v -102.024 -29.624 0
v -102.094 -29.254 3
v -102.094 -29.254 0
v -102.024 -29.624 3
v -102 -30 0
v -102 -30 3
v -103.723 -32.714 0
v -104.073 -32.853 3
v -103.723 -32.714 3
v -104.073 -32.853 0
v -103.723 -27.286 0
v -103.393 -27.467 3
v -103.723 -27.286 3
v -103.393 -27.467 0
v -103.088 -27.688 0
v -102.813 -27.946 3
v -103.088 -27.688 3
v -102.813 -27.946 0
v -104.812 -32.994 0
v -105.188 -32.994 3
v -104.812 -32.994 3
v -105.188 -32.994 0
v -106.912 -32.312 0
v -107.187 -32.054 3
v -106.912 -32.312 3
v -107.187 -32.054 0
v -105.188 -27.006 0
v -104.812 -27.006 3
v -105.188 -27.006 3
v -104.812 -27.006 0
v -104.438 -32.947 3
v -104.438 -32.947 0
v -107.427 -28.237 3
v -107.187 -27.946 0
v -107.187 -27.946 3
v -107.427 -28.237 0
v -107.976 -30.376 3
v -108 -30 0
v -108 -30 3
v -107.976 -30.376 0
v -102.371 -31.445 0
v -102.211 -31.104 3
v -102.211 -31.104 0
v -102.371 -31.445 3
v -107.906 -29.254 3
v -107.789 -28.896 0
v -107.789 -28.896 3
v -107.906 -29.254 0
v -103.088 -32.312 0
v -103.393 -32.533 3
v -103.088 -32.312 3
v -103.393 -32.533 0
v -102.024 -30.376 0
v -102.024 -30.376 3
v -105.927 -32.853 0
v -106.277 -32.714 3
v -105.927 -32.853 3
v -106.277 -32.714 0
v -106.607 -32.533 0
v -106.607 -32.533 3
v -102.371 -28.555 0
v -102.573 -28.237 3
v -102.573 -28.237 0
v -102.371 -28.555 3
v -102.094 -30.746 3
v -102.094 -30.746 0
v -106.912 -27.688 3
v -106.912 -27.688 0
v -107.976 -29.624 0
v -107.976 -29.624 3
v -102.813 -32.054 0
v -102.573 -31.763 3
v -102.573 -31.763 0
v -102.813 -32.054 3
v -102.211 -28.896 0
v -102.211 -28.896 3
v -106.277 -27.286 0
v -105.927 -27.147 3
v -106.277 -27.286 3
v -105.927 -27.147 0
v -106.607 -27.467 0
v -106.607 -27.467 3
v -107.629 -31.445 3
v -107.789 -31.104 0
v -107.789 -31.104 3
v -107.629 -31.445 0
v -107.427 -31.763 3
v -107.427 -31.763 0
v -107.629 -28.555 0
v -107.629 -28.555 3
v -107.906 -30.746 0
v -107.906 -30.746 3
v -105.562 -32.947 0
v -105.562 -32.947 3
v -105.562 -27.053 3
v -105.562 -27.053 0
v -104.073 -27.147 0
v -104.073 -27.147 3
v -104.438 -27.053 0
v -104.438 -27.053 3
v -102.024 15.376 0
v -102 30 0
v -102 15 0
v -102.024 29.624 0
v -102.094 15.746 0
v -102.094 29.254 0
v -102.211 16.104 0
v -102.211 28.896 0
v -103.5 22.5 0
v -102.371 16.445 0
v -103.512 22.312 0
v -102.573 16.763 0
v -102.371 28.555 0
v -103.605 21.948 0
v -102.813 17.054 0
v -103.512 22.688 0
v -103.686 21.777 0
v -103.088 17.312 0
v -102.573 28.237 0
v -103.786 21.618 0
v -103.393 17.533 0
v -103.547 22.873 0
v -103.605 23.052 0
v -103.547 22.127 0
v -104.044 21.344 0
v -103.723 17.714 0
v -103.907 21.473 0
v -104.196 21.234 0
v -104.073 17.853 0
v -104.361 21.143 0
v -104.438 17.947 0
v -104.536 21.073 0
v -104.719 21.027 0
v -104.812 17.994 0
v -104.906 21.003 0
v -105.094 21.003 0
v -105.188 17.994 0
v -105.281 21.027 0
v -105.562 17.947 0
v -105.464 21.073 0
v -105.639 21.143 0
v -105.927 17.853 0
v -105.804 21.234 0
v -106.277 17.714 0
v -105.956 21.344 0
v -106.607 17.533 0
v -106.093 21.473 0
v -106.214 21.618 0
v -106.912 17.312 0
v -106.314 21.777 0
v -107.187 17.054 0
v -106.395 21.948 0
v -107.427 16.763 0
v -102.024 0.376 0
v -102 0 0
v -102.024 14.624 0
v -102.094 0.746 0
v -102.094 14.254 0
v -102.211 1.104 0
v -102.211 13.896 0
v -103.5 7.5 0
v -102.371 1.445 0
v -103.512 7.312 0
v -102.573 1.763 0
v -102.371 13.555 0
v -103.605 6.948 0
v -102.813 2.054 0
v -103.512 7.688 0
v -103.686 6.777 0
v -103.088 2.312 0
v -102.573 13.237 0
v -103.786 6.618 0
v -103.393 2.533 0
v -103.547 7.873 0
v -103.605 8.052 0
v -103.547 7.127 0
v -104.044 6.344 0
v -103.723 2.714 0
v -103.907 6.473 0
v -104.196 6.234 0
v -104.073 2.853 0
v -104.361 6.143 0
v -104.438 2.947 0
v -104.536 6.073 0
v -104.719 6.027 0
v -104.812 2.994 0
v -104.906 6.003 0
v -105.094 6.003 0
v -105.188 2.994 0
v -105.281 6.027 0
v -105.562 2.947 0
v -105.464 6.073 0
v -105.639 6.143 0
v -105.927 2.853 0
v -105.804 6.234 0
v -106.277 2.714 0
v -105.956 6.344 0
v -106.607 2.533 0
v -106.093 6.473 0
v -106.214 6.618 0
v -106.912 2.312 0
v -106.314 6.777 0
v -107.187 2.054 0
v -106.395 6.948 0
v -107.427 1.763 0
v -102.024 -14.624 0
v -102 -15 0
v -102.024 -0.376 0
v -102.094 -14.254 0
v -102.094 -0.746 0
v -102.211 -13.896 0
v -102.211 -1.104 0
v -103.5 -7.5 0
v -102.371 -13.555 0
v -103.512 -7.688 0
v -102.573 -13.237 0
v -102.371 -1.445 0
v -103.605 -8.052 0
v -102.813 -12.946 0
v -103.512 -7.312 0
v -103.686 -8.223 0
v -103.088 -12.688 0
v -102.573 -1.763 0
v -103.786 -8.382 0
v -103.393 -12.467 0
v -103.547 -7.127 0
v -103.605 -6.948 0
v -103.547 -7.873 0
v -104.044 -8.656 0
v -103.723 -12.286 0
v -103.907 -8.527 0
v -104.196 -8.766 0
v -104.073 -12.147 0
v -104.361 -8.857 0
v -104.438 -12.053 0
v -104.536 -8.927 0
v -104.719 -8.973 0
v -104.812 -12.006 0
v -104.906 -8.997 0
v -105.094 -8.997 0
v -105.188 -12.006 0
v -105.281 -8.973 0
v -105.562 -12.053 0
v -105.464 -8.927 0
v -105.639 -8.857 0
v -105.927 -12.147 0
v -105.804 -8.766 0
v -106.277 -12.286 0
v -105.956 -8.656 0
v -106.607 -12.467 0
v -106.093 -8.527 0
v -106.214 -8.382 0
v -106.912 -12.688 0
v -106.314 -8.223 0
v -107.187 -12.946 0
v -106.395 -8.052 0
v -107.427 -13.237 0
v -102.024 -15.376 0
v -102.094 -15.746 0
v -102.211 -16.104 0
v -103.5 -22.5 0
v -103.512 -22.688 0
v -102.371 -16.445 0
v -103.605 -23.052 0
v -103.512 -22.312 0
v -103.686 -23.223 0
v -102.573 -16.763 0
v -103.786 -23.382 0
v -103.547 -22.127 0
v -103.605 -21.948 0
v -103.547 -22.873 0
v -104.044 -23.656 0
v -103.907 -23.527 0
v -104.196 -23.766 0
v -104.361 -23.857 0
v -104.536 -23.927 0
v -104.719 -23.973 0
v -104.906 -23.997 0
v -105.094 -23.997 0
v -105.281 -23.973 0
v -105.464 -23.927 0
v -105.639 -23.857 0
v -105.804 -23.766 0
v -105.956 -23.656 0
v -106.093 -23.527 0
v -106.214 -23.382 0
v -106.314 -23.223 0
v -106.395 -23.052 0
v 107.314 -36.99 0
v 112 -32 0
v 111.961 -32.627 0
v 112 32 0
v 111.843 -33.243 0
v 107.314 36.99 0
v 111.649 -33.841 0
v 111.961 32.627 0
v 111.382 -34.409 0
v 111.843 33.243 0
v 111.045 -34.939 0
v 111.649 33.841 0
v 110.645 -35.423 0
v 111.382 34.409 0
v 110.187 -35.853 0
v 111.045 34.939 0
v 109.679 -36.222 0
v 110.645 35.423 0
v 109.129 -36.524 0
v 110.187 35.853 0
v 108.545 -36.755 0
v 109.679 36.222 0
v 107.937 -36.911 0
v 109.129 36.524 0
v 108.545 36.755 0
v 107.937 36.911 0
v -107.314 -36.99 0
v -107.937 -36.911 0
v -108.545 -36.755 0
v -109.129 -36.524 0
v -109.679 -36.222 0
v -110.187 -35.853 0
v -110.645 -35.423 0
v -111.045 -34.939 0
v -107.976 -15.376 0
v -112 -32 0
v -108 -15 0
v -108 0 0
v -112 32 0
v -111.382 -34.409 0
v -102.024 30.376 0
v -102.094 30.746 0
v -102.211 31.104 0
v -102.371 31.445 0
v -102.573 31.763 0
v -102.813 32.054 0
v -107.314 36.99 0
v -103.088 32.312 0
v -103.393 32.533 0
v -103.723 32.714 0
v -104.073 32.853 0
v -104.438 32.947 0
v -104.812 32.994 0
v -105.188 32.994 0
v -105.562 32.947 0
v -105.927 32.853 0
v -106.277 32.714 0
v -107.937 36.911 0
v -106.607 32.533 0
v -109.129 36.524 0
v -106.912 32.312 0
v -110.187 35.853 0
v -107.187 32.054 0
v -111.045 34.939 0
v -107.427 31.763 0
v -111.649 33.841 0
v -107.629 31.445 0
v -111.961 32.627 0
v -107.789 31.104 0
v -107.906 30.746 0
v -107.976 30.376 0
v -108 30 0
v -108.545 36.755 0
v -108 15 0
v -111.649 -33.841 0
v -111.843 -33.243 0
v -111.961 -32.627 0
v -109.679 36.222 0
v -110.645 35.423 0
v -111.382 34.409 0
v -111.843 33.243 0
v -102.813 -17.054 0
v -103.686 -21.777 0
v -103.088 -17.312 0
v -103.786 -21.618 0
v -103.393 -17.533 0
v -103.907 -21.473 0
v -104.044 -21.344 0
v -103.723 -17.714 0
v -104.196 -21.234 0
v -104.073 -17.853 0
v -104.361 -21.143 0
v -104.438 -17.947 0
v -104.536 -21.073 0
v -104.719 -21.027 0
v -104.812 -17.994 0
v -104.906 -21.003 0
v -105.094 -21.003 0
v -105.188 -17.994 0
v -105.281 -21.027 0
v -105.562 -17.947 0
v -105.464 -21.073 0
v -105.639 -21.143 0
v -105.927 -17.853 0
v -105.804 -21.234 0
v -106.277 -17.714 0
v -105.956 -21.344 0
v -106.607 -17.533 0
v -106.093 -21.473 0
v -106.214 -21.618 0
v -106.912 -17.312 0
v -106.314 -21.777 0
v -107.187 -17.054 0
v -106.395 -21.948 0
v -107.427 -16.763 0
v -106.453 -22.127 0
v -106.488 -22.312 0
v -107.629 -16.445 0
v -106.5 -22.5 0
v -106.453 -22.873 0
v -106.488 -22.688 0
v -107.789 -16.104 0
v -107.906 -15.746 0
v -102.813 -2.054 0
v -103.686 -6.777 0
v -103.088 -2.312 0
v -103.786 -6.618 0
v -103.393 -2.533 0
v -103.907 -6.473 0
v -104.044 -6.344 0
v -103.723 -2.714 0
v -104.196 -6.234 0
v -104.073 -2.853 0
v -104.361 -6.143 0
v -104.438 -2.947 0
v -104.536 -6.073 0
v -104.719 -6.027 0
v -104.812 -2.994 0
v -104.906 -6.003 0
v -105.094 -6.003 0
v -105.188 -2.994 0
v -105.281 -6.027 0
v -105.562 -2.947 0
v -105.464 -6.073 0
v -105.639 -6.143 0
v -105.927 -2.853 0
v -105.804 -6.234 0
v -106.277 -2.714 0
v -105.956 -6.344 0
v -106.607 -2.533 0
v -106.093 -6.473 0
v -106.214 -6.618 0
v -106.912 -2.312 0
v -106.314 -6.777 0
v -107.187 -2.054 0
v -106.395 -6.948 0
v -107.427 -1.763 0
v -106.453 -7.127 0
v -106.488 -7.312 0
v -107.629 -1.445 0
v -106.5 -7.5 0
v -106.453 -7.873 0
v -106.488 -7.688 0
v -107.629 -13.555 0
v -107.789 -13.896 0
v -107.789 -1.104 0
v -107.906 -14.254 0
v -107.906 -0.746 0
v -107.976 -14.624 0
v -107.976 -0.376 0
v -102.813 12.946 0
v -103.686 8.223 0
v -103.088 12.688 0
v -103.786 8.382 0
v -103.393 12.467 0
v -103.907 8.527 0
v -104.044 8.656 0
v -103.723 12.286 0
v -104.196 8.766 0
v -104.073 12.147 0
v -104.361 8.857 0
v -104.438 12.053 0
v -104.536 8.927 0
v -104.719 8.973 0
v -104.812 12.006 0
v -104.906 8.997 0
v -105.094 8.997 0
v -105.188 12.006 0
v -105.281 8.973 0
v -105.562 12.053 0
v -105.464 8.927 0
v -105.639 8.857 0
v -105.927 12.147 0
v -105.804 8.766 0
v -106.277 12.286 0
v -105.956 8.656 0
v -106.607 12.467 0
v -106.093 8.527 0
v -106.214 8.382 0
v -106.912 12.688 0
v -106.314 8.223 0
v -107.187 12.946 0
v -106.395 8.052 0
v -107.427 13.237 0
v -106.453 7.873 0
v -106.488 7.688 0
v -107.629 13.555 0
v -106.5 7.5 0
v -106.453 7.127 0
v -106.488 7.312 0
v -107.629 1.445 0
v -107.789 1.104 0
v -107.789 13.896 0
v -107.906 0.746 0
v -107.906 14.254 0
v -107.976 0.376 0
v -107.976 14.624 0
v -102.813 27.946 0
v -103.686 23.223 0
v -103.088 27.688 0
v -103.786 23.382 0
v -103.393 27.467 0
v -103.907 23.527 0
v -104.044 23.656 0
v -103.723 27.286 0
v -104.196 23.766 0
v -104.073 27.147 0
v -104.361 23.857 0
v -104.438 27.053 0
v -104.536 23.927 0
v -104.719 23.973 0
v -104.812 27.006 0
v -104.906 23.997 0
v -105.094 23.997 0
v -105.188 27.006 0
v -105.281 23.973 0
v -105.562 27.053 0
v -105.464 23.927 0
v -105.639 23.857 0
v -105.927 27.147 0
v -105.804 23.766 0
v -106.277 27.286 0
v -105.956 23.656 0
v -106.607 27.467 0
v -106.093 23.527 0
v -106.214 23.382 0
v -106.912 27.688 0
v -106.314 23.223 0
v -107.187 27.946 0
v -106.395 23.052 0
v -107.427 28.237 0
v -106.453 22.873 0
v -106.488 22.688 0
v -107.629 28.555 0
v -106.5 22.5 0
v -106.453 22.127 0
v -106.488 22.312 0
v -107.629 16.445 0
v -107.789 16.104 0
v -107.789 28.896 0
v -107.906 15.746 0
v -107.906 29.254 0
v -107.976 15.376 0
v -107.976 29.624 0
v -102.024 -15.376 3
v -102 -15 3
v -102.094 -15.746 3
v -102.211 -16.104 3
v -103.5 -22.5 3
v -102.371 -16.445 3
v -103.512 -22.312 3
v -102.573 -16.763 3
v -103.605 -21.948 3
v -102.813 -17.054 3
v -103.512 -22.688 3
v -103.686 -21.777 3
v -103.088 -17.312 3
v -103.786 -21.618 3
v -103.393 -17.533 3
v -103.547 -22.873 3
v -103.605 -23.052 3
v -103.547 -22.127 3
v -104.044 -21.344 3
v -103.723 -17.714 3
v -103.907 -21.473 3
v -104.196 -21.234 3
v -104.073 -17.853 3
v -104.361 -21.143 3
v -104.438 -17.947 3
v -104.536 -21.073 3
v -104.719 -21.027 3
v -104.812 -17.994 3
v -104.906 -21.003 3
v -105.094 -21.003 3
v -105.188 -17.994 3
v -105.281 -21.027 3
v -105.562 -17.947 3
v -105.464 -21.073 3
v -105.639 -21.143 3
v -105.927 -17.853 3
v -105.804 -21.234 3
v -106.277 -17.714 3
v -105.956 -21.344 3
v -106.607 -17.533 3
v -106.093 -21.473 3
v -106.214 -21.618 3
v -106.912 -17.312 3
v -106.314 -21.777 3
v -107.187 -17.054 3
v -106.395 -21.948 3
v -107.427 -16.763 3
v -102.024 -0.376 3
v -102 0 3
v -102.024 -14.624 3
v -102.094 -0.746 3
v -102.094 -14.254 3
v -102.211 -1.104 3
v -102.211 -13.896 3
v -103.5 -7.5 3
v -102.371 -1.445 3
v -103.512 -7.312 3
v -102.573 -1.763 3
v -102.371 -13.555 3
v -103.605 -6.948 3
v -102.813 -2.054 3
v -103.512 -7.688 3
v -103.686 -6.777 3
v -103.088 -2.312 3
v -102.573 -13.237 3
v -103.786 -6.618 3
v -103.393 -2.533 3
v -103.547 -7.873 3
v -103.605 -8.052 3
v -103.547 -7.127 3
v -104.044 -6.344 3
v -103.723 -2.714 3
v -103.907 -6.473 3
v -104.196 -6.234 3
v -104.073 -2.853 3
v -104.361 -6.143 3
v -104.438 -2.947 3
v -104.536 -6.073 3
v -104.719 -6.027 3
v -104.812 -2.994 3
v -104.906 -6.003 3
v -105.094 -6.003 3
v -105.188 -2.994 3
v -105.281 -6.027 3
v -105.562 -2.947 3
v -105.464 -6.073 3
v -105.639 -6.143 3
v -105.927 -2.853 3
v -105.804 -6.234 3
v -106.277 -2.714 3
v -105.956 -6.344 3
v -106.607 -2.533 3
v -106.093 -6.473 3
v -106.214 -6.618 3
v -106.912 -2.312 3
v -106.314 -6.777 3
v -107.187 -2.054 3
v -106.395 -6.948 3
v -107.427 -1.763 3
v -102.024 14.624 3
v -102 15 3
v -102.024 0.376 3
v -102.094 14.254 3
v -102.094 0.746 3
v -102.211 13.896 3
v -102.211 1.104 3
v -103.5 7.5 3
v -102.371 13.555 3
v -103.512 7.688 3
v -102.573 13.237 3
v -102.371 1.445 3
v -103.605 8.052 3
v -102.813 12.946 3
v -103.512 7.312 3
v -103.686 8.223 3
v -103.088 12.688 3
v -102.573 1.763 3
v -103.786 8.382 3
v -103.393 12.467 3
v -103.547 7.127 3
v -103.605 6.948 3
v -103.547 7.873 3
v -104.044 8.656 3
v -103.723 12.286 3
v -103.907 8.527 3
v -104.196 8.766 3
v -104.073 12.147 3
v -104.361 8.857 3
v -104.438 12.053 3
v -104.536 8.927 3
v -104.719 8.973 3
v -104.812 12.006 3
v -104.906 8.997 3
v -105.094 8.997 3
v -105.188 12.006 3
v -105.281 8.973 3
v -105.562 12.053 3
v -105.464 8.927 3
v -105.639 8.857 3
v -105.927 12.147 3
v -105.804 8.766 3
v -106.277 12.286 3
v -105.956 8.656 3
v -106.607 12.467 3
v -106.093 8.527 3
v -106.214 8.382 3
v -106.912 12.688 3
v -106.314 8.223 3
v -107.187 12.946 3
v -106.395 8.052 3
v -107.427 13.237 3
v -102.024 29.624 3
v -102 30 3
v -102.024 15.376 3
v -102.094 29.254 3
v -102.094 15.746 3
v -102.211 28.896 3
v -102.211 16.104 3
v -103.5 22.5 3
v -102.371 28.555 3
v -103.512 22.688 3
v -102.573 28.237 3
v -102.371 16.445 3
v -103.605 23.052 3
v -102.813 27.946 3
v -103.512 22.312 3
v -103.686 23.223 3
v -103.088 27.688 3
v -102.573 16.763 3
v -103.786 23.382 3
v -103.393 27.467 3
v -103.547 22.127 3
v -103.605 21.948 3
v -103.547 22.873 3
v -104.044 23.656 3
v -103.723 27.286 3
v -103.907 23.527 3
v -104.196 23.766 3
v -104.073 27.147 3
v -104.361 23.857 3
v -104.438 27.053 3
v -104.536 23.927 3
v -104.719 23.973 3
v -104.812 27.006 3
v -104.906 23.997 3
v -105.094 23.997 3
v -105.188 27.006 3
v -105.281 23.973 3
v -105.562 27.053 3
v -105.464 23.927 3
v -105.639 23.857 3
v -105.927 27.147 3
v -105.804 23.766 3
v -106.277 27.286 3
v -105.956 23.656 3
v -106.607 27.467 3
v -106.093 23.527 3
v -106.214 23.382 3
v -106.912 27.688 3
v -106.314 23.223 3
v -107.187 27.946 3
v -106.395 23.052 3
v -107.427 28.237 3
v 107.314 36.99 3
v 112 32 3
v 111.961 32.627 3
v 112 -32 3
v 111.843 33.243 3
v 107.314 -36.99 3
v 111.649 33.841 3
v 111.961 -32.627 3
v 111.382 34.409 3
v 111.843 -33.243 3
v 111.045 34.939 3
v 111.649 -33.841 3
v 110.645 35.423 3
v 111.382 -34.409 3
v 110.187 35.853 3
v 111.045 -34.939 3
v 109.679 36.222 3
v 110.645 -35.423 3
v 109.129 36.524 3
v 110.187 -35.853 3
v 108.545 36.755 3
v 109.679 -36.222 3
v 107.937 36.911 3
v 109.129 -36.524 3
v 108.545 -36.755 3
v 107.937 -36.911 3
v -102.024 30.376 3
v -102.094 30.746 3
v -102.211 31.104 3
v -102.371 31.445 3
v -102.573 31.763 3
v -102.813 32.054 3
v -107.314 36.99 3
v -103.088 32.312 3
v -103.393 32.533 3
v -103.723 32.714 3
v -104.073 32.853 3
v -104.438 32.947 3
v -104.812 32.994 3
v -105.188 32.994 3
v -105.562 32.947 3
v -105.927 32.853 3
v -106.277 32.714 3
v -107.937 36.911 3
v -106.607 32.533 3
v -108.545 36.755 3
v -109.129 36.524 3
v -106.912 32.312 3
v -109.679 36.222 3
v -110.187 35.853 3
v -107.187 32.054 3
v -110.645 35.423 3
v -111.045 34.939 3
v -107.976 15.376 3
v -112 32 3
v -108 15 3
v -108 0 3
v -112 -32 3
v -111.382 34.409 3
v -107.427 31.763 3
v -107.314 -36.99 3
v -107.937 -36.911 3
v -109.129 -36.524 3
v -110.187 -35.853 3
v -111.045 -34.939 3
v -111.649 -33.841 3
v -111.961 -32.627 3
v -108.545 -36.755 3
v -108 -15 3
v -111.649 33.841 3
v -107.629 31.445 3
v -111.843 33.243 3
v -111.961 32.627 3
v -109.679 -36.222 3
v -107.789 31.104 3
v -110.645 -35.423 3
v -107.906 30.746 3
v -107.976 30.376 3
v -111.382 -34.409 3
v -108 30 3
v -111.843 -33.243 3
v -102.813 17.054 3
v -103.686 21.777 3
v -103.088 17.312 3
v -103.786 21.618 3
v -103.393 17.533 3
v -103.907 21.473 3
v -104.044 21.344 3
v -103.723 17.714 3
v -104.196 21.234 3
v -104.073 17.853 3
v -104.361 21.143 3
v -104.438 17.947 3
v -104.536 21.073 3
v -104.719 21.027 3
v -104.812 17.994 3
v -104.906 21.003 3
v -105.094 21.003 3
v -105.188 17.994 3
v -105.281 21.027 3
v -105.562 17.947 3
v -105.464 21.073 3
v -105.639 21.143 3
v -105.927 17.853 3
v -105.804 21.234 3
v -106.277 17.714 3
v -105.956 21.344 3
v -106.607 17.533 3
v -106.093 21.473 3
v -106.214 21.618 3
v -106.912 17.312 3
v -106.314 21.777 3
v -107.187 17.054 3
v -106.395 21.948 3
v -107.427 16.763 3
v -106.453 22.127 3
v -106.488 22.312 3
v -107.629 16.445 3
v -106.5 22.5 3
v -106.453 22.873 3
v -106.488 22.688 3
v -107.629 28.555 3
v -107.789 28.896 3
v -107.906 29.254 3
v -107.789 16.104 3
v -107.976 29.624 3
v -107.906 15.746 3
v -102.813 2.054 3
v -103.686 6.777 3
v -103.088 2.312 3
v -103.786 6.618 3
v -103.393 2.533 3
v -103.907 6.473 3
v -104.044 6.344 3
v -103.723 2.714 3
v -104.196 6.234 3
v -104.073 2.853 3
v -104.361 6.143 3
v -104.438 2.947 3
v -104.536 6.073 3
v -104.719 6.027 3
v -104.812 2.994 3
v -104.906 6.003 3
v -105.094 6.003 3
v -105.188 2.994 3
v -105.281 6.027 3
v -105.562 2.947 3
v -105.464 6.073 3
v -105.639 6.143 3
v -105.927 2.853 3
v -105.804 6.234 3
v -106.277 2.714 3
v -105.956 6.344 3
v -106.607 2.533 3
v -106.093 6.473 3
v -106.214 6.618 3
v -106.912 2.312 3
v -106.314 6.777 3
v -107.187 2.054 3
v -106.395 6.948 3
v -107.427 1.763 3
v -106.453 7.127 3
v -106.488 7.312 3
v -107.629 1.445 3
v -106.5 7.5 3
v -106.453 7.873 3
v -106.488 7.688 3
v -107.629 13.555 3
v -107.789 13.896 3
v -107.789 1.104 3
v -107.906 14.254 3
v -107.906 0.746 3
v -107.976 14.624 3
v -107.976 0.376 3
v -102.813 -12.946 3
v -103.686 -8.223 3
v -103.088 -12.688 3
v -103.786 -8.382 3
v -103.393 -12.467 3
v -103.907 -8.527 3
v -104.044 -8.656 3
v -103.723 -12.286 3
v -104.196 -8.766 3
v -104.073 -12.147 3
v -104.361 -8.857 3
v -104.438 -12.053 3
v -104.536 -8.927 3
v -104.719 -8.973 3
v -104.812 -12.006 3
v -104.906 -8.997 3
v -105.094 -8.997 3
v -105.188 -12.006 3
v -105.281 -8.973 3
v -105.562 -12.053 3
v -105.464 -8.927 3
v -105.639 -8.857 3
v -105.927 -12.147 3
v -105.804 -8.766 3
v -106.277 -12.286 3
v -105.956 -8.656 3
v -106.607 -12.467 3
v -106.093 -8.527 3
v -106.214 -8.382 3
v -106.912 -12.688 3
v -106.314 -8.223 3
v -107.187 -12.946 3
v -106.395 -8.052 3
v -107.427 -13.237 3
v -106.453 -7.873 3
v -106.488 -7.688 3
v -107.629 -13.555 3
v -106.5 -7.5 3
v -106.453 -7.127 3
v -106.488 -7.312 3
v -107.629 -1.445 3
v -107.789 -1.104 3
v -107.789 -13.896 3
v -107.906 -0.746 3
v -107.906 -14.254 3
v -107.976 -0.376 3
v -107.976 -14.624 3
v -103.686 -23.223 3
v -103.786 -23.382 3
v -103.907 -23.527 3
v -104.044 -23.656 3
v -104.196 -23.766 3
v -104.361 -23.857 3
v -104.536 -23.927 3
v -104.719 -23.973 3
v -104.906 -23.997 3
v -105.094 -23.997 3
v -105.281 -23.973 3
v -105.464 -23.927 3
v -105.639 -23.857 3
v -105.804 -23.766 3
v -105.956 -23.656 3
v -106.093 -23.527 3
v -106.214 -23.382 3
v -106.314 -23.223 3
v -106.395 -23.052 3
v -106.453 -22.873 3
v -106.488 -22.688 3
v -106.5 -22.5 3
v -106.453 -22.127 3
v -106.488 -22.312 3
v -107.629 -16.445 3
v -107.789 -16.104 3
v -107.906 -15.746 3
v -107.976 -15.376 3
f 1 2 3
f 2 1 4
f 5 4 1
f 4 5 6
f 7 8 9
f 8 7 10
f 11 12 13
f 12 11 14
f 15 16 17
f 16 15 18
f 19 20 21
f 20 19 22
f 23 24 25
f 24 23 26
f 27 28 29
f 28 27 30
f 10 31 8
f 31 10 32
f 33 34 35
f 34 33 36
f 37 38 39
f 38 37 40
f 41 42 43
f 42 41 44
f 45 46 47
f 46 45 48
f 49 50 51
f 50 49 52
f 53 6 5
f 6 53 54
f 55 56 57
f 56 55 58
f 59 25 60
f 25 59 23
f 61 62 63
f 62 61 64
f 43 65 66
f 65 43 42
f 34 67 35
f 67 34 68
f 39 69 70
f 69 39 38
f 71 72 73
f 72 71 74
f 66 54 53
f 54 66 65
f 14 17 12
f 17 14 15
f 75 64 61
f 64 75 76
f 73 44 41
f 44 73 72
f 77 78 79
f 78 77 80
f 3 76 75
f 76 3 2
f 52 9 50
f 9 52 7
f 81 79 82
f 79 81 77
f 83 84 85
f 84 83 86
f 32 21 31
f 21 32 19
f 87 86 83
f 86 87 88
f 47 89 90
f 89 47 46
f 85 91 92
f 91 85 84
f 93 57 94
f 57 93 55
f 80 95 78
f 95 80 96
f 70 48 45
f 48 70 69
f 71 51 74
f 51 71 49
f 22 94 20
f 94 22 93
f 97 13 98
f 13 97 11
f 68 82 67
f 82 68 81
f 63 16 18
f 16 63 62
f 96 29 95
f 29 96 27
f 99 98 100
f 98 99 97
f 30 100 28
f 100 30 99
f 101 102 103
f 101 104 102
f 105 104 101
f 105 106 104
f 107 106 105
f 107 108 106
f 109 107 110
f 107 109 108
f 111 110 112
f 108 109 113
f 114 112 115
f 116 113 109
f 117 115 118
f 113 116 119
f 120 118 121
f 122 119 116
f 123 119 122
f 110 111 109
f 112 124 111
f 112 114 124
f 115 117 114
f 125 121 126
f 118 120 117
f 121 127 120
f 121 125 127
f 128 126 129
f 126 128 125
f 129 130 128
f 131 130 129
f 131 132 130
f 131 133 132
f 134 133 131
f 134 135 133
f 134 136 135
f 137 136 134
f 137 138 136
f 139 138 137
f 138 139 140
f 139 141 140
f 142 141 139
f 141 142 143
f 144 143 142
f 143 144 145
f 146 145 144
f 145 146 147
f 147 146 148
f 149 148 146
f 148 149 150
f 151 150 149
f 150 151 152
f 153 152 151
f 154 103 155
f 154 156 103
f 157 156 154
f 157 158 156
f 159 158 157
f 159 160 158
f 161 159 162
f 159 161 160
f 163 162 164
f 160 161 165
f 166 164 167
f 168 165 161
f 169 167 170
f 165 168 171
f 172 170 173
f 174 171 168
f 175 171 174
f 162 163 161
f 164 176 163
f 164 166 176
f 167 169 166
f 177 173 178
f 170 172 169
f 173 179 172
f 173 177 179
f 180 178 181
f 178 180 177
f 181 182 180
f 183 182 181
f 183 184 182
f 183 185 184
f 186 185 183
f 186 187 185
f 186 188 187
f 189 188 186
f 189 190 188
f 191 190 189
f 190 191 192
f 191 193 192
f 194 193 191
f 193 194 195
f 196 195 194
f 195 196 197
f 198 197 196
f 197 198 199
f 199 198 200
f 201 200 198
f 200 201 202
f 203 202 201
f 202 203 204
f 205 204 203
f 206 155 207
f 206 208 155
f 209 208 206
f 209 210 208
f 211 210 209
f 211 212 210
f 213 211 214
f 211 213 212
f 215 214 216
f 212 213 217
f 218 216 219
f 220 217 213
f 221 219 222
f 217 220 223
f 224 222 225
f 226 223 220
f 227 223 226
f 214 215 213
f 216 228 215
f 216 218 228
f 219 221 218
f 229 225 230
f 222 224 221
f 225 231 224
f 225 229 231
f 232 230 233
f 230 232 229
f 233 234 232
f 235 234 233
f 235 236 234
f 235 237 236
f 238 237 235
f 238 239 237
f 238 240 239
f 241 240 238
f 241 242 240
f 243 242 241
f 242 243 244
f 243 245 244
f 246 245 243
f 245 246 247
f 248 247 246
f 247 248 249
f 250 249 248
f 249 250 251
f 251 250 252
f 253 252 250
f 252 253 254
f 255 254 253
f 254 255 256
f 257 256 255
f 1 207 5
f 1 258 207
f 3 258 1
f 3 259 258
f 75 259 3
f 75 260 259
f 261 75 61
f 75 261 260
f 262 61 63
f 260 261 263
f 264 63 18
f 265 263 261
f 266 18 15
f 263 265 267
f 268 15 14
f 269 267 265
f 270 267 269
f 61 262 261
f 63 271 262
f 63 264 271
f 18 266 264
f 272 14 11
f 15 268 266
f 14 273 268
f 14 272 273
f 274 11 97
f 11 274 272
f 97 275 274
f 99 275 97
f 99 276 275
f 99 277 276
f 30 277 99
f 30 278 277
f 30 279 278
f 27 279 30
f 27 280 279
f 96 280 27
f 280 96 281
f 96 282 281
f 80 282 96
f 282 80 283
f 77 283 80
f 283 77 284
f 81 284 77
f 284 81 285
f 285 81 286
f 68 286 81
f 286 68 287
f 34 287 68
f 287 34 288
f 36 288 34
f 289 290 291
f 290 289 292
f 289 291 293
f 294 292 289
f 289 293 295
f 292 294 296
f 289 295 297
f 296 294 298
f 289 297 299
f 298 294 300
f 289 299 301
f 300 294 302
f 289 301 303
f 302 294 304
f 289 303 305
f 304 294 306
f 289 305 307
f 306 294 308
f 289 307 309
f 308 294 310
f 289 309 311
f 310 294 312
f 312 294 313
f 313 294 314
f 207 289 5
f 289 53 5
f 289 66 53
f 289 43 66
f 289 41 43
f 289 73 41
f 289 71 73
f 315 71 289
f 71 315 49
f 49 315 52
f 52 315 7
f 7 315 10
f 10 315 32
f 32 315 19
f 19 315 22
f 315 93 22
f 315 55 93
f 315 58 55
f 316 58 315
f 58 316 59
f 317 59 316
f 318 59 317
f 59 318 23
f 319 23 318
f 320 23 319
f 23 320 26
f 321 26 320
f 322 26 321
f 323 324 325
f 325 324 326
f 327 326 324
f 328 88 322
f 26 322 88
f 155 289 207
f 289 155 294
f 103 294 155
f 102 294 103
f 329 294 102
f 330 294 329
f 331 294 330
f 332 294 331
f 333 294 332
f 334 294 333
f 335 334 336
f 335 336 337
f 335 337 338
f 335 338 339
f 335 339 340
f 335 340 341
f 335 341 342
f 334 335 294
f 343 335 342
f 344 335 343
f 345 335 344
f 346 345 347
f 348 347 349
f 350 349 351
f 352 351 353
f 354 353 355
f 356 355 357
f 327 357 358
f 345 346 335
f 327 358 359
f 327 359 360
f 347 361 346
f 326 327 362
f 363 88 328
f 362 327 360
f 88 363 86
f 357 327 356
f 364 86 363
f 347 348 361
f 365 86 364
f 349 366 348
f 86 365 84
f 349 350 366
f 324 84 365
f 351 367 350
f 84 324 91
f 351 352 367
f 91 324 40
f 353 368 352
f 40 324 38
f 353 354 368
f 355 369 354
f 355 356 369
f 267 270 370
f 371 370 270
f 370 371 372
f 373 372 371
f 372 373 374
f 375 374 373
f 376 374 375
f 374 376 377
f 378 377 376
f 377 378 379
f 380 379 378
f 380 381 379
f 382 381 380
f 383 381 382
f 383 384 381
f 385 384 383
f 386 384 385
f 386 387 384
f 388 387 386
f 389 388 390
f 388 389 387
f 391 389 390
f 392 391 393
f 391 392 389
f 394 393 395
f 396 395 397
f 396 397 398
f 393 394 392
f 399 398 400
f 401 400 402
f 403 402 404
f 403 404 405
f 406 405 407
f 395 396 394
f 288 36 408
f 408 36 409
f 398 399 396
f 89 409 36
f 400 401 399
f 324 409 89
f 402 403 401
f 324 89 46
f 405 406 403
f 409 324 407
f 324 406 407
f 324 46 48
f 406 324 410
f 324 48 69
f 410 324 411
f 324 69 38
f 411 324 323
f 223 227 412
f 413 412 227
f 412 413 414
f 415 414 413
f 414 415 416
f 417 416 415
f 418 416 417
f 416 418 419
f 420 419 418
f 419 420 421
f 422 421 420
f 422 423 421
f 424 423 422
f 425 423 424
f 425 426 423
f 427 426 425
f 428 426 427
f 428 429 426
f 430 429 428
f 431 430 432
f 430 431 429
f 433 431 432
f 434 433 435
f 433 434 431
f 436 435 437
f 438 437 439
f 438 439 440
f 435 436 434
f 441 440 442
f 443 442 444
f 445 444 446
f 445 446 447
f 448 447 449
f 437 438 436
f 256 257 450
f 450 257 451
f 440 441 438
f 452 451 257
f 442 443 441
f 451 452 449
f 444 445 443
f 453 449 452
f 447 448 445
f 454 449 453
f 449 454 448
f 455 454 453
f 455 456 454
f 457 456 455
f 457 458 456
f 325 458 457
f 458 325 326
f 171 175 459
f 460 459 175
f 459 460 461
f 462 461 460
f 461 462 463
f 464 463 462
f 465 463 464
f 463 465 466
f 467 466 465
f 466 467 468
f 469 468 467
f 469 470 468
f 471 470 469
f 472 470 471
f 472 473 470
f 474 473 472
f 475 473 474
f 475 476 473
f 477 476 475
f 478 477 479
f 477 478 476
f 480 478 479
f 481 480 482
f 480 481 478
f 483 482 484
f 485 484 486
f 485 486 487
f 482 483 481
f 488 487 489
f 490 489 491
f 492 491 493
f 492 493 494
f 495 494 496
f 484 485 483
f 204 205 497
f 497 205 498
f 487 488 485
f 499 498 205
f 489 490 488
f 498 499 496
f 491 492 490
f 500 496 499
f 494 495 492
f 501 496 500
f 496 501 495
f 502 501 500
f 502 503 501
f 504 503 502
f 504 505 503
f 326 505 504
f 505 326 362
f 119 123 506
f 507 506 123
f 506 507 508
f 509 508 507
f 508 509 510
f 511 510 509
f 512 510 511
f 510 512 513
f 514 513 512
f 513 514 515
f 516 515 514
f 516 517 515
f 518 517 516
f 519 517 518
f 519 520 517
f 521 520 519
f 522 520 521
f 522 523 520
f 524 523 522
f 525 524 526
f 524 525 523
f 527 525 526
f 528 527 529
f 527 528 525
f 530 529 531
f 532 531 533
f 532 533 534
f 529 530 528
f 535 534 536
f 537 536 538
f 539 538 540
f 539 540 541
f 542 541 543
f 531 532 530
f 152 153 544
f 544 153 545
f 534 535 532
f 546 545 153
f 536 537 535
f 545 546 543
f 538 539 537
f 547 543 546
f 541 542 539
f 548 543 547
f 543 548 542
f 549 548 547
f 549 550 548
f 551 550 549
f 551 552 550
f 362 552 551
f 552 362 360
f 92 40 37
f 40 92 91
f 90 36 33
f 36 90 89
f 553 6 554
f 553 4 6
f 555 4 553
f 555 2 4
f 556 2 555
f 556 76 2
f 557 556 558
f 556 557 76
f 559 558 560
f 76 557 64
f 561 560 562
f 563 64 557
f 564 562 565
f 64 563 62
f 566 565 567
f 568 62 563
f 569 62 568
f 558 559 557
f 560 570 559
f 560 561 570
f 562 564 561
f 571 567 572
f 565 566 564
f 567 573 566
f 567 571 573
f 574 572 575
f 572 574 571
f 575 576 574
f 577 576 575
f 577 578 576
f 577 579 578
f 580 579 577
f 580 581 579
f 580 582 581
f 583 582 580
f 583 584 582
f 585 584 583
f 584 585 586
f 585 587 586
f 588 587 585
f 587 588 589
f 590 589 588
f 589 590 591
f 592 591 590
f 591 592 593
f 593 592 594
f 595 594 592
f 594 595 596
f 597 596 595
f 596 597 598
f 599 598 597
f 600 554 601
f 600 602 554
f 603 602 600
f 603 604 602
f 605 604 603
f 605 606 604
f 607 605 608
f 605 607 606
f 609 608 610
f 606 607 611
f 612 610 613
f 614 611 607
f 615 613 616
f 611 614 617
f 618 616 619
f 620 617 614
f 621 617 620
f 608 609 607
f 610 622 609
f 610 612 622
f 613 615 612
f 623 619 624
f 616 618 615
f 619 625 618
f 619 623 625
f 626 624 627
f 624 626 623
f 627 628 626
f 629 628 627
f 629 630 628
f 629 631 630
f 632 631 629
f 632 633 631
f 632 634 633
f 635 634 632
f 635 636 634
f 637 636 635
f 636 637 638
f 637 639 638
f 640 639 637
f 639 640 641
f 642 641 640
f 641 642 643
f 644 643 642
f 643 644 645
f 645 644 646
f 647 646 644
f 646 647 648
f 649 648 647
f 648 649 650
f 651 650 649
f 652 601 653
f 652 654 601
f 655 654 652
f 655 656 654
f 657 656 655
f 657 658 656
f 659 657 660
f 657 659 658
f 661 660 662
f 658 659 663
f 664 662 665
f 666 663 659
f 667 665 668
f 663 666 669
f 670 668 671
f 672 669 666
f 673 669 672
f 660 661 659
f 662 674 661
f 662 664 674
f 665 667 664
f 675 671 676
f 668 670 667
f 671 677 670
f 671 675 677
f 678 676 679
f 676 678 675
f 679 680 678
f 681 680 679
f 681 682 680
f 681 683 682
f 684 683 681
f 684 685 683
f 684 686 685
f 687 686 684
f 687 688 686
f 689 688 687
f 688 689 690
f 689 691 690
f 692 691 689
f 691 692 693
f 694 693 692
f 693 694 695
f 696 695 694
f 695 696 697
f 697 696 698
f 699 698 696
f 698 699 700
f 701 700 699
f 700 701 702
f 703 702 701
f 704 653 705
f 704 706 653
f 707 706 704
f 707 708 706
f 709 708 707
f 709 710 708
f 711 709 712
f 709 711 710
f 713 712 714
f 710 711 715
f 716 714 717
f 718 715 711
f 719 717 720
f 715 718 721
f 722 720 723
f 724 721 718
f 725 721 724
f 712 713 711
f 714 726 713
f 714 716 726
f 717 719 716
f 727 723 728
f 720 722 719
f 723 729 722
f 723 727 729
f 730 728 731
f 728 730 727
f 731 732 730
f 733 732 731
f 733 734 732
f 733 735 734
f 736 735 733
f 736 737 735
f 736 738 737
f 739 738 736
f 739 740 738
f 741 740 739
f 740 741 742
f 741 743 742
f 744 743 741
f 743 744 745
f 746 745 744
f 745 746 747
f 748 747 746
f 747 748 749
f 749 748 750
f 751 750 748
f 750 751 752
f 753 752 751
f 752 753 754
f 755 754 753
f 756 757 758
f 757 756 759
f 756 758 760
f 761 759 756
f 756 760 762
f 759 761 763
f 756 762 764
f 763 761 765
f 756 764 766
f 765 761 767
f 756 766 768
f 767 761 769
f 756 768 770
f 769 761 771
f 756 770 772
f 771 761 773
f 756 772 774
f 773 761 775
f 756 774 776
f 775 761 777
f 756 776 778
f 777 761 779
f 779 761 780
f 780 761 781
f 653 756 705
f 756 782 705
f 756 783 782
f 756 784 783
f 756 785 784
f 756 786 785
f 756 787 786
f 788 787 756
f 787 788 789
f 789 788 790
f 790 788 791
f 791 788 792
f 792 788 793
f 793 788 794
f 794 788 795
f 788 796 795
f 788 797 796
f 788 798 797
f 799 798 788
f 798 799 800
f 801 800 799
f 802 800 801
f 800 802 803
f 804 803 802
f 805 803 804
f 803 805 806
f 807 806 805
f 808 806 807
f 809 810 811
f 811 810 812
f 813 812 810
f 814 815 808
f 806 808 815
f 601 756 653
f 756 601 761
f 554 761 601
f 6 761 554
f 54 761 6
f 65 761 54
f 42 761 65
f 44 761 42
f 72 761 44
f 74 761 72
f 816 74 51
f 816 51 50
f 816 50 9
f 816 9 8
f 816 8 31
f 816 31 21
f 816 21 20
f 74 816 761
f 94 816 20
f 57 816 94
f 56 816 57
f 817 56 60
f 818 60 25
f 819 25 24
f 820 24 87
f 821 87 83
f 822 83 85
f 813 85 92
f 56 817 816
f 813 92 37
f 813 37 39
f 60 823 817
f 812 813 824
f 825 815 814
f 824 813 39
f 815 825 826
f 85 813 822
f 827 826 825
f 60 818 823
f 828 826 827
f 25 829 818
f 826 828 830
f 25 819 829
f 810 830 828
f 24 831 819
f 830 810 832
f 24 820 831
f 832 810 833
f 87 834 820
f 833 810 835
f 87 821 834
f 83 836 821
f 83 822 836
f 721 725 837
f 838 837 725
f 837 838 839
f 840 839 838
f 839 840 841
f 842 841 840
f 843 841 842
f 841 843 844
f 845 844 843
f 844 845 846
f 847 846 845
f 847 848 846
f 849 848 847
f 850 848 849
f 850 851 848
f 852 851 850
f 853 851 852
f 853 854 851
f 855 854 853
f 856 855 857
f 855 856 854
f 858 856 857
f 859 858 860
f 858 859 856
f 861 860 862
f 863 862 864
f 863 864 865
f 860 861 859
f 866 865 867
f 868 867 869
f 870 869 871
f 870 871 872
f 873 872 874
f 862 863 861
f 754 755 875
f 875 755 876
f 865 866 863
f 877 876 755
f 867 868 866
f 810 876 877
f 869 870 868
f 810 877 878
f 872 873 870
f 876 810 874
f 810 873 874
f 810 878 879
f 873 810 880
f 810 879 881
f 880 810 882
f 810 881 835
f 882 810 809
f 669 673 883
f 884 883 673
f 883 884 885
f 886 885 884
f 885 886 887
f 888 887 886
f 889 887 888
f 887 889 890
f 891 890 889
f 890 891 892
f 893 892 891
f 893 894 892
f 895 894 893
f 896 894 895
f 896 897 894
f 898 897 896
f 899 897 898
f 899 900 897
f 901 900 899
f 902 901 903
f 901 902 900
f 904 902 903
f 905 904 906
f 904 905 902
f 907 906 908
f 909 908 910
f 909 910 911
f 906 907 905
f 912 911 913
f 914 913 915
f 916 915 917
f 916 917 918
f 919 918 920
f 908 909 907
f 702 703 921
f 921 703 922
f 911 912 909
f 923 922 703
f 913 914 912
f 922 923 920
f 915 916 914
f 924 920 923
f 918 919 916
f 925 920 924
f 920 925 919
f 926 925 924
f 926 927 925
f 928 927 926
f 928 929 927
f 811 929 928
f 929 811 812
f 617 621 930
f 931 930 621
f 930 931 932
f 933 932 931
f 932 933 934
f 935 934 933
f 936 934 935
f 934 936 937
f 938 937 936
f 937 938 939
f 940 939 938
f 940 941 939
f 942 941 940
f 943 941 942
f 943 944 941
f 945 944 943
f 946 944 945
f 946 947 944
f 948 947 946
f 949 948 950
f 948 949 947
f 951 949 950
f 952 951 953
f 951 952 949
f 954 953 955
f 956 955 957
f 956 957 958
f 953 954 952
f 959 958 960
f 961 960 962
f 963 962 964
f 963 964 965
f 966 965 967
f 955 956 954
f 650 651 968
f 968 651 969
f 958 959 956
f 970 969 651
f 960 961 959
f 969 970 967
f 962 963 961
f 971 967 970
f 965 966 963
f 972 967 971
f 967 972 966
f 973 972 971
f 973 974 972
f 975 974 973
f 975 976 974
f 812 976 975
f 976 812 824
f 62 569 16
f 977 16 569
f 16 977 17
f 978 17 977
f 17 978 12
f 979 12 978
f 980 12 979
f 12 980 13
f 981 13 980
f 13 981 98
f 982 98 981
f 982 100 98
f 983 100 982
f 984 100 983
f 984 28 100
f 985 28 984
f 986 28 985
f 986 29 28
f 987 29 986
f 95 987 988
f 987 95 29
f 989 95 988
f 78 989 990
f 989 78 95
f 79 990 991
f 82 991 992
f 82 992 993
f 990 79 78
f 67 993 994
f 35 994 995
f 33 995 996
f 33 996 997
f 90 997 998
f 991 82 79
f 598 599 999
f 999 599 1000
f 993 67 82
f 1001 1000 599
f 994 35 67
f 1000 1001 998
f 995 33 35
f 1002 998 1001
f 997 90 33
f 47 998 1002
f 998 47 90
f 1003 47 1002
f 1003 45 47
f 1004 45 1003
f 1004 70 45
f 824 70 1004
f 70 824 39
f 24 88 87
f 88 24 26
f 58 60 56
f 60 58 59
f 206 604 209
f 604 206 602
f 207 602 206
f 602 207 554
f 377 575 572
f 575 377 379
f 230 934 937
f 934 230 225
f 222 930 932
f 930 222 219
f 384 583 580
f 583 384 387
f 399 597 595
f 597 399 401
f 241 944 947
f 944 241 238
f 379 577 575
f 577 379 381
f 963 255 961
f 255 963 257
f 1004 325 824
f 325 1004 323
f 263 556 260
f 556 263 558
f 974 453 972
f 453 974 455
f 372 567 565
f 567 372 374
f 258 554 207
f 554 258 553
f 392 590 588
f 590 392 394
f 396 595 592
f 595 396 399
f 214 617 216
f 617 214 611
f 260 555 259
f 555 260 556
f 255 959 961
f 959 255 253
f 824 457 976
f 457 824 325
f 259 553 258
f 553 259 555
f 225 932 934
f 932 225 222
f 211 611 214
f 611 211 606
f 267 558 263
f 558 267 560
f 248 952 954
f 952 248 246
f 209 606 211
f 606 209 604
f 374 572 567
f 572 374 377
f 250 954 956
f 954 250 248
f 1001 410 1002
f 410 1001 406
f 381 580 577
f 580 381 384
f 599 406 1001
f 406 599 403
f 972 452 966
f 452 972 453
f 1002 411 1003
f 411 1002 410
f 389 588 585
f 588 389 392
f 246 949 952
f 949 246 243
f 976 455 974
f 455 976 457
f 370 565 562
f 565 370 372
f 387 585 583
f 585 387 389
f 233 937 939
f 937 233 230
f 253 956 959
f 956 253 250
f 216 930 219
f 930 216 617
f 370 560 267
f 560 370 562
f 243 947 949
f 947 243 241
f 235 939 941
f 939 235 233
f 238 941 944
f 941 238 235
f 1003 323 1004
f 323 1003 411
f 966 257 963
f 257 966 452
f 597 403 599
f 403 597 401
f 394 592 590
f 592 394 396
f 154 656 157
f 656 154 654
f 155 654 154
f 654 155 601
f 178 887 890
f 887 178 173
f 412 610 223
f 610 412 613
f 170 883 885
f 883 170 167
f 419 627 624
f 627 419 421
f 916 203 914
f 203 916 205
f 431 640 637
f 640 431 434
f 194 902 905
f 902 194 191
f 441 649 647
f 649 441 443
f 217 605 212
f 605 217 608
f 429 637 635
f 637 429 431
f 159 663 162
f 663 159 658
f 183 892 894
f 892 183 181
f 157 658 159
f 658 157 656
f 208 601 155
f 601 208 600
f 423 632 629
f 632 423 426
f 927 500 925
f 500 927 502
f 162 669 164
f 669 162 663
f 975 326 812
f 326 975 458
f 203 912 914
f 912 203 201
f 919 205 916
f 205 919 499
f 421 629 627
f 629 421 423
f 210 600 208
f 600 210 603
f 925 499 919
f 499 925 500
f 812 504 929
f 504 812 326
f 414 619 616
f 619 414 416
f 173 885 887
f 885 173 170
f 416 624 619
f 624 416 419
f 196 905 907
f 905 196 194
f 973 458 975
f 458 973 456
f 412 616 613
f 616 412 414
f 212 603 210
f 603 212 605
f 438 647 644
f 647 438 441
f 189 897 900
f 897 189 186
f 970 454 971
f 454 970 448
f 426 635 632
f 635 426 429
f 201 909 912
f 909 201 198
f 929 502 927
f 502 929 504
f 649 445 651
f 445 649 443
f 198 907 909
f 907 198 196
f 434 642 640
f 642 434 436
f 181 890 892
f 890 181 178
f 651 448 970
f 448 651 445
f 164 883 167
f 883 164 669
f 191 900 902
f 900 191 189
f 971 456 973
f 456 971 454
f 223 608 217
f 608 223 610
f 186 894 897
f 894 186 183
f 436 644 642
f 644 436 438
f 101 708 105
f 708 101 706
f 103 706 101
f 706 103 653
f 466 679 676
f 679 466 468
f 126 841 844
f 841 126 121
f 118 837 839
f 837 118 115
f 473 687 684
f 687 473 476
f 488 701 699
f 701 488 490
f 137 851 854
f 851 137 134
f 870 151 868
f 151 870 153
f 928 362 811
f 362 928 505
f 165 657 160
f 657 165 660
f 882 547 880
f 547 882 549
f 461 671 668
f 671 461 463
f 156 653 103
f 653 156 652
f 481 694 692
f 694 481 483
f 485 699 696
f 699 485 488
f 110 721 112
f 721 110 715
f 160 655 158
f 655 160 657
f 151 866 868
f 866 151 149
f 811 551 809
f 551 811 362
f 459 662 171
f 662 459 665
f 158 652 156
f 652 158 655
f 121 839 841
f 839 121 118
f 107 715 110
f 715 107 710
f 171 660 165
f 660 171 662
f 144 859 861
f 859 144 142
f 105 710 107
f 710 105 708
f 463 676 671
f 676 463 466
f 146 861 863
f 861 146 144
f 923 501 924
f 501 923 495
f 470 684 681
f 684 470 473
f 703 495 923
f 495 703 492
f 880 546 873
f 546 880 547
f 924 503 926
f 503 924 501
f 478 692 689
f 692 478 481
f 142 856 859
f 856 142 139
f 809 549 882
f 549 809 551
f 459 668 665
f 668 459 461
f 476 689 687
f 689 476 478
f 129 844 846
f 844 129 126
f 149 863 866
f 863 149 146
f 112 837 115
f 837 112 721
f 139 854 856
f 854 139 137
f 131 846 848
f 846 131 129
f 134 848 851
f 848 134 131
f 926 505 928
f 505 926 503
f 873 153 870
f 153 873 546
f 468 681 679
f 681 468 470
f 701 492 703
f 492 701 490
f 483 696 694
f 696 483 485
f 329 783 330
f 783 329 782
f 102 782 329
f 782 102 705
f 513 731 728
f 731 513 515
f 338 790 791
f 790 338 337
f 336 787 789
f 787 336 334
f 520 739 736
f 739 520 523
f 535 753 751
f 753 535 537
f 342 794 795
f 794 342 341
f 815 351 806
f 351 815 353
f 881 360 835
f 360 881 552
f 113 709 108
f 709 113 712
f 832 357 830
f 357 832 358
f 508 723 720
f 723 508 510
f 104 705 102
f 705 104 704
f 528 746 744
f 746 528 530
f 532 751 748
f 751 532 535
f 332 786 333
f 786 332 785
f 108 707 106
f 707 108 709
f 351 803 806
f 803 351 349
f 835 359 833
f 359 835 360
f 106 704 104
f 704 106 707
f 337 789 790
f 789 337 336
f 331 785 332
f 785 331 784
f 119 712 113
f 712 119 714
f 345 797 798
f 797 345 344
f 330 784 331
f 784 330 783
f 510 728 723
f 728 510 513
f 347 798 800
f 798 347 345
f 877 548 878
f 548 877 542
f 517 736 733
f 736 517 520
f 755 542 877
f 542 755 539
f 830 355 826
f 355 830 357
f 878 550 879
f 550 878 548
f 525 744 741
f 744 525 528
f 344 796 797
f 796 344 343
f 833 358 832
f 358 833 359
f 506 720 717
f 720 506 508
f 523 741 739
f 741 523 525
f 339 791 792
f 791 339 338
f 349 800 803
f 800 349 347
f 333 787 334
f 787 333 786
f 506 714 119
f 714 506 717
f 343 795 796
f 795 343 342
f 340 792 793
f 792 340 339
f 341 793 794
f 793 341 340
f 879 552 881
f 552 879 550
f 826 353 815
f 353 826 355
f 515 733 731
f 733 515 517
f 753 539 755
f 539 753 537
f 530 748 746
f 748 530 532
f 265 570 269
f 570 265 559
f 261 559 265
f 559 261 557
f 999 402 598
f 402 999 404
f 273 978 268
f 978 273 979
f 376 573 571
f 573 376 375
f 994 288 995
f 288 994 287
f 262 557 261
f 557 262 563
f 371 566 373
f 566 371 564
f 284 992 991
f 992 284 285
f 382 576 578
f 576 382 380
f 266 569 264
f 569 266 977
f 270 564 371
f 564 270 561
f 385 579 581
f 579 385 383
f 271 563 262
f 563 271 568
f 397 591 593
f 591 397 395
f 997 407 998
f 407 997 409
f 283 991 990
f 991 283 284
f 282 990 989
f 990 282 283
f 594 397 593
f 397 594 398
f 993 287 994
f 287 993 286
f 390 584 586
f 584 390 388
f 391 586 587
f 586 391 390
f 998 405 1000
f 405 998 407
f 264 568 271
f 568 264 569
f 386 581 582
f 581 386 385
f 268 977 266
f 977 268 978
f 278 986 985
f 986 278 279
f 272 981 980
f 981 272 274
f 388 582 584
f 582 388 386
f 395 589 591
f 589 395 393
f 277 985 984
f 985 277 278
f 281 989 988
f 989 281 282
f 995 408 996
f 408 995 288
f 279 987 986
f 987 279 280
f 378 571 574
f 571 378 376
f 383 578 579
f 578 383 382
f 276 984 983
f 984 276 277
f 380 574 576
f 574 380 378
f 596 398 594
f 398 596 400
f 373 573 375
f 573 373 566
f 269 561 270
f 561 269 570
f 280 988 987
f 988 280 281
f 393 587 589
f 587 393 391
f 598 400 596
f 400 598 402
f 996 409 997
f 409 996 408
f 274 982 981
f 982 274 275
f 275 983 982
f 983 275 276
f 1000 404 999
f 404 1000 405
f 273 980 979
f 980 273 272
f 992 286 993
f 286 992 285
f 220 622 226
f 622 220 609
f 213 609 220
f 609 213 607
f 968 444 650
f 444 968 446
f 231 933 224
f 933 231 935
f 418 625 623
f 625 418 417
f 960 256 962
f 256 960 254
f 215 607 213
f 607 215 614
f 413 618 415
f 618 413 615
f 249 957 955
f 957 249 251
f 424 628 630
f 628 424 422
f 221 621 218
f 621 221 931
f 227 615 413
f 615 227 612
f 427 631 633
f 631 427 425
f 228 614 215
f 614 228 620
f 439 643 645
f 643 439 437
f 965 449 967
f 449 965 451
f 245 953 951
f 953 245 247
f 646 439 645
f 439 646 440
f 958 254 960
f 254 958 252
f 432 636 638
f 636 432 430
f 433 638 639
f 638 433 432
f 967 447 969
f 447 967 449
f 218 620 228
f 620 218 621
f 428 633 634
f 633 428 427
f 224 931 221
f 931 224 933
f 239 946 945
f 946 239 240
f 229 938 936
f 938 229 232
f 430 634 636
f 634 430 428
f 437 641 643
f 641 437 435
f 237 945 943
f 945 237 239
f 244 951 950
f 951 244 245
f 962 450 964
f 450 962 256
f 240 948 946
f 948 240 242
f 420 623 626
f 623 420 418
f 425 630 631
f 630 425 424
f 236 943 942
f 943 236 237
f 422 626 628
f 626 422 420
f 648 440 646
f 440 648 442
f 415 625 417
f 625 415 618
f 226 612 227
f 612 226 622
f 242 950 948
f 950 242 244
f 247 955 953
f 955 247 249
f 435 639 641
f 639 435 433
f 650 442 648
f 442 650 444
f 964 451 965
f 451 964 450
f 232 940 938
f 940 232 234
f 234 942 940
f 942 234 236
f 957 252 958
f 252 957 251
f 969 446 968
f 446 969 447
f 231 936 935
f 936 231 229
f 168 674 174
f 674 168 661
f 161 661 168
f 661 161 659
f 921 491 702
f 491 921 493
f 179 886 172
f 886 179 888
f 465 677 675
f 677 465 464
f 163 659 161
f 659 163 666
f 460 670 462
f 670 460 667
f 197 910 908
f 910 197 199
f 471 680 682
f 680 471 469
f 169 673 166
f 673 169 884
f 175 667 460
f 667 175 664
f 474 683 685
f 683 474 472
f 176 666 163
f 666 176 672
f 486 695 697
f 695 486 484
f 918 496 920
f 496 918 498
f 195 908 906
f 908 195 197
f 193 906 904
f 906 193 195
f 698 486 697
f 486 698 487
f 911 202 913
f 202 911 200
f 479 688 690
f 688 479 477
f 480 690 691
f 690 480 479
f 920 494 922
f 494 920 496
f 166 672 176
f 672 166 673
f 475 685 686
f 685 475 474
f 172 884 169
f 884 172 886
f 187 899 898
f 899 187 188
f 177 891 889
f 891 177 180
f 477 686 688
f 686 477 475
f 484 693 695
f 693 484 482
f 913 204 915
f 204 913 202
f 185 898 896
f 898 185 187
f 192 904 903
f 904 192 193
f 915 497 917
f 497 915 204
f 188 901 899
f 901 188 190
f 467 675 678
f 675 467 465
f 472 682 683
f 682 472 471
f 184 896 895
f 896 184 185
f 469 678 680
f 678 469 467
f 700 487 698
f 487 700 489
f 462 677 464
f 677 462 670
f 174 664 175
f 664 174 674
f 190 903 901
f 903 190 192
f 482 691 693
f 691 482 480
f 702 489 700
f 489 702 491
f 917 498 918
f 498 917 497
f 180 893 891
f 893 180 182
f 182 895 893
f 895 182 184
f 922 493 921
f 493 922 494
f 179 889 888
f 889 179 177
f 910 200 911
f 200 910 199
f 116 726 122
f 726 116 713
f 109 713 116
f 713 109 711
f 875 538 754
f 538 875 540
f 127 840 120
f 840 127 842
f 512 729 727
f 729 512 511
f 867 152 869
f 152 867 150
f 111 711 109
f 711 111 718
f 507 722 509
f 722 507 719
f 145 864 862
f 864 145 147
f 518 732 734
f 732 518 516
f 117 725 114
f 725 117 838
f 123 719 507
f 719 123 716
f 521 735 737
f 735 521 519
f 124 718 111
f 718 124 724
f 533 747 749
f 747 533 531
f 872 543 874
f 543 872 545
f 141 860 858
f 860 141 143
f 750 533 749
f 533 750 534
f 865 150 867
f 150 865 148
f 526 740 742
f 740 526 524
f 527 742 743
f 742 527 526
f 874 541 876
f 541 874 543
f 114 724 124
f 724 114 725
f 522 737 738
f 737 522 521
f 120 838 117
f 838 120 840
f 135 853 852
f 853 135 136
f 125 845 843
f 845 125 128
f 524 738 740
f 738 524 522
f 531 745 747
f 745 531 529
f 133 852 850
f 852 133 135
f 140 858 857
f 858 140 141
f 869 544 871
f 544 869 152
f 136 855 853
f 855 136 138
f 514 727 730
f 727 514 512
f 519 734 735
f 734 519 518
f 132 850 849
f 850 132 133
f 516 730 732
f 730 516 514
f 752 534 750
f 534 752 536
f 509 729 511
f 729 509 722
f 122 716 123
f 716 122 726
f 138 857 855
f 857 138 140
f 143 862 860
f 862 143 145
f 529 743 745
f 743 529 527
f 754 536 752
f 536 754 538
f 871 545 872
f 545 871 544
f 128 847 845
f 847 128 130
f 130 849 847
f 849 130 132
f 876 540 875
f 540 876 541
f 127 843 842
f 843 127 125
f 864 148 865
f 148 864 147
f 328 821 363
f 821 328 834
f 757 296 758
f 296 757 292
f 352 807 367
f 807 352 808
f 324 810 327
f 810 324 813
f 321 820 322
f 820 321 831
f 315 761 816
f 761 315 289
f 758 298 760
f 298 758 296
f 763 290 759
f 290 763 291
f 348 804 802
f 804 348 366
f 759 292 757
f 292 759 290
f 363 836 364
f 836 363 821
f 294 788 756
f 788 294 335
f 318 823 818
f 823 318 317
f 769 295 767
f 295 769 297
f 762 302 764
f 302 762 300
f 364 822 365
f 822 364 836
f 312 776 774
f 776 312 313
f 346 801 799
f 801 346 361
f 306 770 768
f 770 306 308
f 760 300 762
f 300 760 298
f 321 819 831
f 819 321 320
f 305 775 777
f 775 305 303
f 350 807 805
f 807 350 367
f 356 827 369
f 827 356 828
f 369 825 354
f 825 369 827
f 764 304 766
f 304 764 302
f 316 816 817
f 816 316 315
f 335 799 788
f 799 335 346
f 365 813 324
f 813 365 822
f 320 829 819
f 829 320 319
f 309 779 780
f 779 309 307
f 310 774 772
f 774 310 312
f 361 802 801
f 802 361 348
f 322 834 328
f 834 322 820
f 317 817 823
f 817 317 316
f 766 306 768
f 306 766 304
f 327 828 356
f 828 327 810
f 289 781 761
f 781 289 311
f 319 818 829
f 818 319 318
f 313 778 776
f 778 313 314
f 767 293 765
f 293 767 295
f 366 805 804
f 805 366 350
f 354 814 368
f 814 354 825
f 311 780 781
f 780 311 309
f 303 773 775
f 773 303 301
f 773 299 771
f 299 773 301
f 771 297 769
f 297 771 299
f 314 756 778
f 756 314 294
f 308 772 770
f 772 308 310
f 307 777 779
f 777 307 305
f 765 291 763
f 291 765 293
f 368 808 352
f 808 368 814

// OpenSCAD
$fn = 50;


difference() {
	union() {
		hull() {
			translate(v = [-107.0000000000, 32.0000000000, 0]) {
				cylinder(h = 3, r = 5);
			}
			translate(v = [107.0000000000, 32.0000000000, 0]) {
				cylinder(h = 3, r = 5);
			}
			translate(v = [-107.0000000000, -32.0000000000, 0]) {
				cylinder(h = 3, r = 5);
			}
			translate(v = [107.0000000000, -32.0000000000, 0]) {
				cylinder(h = 3, r = 5);
			}
		}
	}
	union() {
		translate(v = [-105.0000000000, -30.0000000000, 0]) {
			cylinder(h = 3, r = 3.0000000000);
		}
		translate(v = [-105.0000000000, -15.0000000000, 0]) {
			cylinder(h = 3, r = 3.0000000000);
		}
		translate(v = [-105.0000000000, 0.0000000000, 0]) {
			cylinder(h = 3, r = 3.0000000000);
		}
		translate(v = [-105.0000000000, 15.0000000000, 0]) {
			cylinder(h = 3, r = 3.0000000000);
		}
		translate(v = [-105.0000000000, 30.0000000000, 0]) {
			cylinder(h = 3, r = 3.0000000000);
		}
		translate(v = [-105.0000000000, -30.0000000000, 0]) {
			cylinder(h = 3, r = 1.5000000000);
		}
		translate(v = [-105.0000000000, -22.5000000000, 0]) {
			cylinder(h = 3, r = 1.5000000000);
		}
		translate(v = [-105.0000000000, -15.0000000000, 0]) {
			cylinder(h = 3, r = 1.5000000000);
		}
		translate(v = [-105.0000000000, -7.5000000000, 0]) {
			cylinder(h = 3, r = 1.5000000000);
		}
		translate(v = [-105.0000000000, 0.0000000000, 0]) {
			cylinder(h = 3, r = 1.5000000000);
		}
		translate(v = [-105.0000000000, 7.5000000000, 0]) {
			cylinder(h = 3, r = 1.5000000000);
		}
		translate(v = [-105.0000000000, 15.0000000000, 0]) {
			cylinder(h = 3, r = 1.5000000000);
		}
		translate(v = [-105.0000000000, 22.5000000000, 0]) {
			cylinder(h = 3, r = 1.5000000000);
		}
		translate(v = [-105.0000000000, 30.0000000000, 0]) {
			cylinder(h = 3, r = 1.5000000000);
		}
		translate(v = [-105.0000000000, -30.0000000000, 0]) {
			cylinder(h = 3, r = 1.5000000000);
		}
		translate(v = [-105.0000000000, -22.5000000000, 0]) {
			cylinder(h = 3, r = 1.5000000000);
		}
		translate(v = [-105.0000000000, -15.0000000000, 0]) {
			cylinder(h = 3, r = 1.5000000000);
		}
		translate(v = [-105.0000000000, -7.5000000000, 0]) {
			cylinder(h = 3, r = 1.5000000000);
		}
		translate(v = [-105.0000000000, 0.0000000000, 0]) {
			cylinder(h = 3, r = 1.5000000000);
		}
		translate(v = [-105.0000000000, 7.5000000000, 0]) {
			cylinder(h = 3, r = 1.5000000000);
		}
		translate(v = [-105.0000000000, 15.0000000000, 0]) {
			cylinder(h = 3, r = 1.5000000000);
		}
		translate(v = [-105.0000000000, 22.5000000000, 0]) {
			cylinder(h = 3, r = 1.5000000000);
		}
		translate(v = [-105.0000000000, 30.0000000000, 0]) {
			cylinder(h = 3, r = 1.5000000000);
		}
		translate(v = [-105.0000000000, -30.0000000000, 0]) {
			cylinder(h = 3, r = 1.5000000000);
		}
		translate(v = [-105.0000000000, -22.5000000000, 0]) {
			cylinder(h = 3, r = 1.5000000000);
		}
		translate(v = [-105.0000000000, -15.0000000000, 0]) {
			cylinder(h = 3, r = 1.5000000000);
		}
		translate(v = [-105.0000000000, -7.5000000000, 0]) {
			cylinder(h = 3, r = 1.5000000000);
		}
		translate(v = [-105.0000000000, 0.0000000000, 0]) {
			cylinder(h = 3, r = 1.5000000000);
		}
		translate(v = [-105.0000000000, 7.5000000000, 0]) {
			cylinder(h = 3, r = 1.5000000000);
		}
		translate(v = [-105.0000000000, 15.0000000000, 0]) {
			cylinder(h = 3, r = 1.5000000000);
		}
		translate(v = [-105.0000000000, 22.5000000000, 0]) {
			cylinder(h = 3, r = 1.5000000000);
		}
		translate(v = [-105.0000000000, 30.0000000000, 0]) {
			cylinder(h = 3, r = 1.5000000000);
		}
	}
}
